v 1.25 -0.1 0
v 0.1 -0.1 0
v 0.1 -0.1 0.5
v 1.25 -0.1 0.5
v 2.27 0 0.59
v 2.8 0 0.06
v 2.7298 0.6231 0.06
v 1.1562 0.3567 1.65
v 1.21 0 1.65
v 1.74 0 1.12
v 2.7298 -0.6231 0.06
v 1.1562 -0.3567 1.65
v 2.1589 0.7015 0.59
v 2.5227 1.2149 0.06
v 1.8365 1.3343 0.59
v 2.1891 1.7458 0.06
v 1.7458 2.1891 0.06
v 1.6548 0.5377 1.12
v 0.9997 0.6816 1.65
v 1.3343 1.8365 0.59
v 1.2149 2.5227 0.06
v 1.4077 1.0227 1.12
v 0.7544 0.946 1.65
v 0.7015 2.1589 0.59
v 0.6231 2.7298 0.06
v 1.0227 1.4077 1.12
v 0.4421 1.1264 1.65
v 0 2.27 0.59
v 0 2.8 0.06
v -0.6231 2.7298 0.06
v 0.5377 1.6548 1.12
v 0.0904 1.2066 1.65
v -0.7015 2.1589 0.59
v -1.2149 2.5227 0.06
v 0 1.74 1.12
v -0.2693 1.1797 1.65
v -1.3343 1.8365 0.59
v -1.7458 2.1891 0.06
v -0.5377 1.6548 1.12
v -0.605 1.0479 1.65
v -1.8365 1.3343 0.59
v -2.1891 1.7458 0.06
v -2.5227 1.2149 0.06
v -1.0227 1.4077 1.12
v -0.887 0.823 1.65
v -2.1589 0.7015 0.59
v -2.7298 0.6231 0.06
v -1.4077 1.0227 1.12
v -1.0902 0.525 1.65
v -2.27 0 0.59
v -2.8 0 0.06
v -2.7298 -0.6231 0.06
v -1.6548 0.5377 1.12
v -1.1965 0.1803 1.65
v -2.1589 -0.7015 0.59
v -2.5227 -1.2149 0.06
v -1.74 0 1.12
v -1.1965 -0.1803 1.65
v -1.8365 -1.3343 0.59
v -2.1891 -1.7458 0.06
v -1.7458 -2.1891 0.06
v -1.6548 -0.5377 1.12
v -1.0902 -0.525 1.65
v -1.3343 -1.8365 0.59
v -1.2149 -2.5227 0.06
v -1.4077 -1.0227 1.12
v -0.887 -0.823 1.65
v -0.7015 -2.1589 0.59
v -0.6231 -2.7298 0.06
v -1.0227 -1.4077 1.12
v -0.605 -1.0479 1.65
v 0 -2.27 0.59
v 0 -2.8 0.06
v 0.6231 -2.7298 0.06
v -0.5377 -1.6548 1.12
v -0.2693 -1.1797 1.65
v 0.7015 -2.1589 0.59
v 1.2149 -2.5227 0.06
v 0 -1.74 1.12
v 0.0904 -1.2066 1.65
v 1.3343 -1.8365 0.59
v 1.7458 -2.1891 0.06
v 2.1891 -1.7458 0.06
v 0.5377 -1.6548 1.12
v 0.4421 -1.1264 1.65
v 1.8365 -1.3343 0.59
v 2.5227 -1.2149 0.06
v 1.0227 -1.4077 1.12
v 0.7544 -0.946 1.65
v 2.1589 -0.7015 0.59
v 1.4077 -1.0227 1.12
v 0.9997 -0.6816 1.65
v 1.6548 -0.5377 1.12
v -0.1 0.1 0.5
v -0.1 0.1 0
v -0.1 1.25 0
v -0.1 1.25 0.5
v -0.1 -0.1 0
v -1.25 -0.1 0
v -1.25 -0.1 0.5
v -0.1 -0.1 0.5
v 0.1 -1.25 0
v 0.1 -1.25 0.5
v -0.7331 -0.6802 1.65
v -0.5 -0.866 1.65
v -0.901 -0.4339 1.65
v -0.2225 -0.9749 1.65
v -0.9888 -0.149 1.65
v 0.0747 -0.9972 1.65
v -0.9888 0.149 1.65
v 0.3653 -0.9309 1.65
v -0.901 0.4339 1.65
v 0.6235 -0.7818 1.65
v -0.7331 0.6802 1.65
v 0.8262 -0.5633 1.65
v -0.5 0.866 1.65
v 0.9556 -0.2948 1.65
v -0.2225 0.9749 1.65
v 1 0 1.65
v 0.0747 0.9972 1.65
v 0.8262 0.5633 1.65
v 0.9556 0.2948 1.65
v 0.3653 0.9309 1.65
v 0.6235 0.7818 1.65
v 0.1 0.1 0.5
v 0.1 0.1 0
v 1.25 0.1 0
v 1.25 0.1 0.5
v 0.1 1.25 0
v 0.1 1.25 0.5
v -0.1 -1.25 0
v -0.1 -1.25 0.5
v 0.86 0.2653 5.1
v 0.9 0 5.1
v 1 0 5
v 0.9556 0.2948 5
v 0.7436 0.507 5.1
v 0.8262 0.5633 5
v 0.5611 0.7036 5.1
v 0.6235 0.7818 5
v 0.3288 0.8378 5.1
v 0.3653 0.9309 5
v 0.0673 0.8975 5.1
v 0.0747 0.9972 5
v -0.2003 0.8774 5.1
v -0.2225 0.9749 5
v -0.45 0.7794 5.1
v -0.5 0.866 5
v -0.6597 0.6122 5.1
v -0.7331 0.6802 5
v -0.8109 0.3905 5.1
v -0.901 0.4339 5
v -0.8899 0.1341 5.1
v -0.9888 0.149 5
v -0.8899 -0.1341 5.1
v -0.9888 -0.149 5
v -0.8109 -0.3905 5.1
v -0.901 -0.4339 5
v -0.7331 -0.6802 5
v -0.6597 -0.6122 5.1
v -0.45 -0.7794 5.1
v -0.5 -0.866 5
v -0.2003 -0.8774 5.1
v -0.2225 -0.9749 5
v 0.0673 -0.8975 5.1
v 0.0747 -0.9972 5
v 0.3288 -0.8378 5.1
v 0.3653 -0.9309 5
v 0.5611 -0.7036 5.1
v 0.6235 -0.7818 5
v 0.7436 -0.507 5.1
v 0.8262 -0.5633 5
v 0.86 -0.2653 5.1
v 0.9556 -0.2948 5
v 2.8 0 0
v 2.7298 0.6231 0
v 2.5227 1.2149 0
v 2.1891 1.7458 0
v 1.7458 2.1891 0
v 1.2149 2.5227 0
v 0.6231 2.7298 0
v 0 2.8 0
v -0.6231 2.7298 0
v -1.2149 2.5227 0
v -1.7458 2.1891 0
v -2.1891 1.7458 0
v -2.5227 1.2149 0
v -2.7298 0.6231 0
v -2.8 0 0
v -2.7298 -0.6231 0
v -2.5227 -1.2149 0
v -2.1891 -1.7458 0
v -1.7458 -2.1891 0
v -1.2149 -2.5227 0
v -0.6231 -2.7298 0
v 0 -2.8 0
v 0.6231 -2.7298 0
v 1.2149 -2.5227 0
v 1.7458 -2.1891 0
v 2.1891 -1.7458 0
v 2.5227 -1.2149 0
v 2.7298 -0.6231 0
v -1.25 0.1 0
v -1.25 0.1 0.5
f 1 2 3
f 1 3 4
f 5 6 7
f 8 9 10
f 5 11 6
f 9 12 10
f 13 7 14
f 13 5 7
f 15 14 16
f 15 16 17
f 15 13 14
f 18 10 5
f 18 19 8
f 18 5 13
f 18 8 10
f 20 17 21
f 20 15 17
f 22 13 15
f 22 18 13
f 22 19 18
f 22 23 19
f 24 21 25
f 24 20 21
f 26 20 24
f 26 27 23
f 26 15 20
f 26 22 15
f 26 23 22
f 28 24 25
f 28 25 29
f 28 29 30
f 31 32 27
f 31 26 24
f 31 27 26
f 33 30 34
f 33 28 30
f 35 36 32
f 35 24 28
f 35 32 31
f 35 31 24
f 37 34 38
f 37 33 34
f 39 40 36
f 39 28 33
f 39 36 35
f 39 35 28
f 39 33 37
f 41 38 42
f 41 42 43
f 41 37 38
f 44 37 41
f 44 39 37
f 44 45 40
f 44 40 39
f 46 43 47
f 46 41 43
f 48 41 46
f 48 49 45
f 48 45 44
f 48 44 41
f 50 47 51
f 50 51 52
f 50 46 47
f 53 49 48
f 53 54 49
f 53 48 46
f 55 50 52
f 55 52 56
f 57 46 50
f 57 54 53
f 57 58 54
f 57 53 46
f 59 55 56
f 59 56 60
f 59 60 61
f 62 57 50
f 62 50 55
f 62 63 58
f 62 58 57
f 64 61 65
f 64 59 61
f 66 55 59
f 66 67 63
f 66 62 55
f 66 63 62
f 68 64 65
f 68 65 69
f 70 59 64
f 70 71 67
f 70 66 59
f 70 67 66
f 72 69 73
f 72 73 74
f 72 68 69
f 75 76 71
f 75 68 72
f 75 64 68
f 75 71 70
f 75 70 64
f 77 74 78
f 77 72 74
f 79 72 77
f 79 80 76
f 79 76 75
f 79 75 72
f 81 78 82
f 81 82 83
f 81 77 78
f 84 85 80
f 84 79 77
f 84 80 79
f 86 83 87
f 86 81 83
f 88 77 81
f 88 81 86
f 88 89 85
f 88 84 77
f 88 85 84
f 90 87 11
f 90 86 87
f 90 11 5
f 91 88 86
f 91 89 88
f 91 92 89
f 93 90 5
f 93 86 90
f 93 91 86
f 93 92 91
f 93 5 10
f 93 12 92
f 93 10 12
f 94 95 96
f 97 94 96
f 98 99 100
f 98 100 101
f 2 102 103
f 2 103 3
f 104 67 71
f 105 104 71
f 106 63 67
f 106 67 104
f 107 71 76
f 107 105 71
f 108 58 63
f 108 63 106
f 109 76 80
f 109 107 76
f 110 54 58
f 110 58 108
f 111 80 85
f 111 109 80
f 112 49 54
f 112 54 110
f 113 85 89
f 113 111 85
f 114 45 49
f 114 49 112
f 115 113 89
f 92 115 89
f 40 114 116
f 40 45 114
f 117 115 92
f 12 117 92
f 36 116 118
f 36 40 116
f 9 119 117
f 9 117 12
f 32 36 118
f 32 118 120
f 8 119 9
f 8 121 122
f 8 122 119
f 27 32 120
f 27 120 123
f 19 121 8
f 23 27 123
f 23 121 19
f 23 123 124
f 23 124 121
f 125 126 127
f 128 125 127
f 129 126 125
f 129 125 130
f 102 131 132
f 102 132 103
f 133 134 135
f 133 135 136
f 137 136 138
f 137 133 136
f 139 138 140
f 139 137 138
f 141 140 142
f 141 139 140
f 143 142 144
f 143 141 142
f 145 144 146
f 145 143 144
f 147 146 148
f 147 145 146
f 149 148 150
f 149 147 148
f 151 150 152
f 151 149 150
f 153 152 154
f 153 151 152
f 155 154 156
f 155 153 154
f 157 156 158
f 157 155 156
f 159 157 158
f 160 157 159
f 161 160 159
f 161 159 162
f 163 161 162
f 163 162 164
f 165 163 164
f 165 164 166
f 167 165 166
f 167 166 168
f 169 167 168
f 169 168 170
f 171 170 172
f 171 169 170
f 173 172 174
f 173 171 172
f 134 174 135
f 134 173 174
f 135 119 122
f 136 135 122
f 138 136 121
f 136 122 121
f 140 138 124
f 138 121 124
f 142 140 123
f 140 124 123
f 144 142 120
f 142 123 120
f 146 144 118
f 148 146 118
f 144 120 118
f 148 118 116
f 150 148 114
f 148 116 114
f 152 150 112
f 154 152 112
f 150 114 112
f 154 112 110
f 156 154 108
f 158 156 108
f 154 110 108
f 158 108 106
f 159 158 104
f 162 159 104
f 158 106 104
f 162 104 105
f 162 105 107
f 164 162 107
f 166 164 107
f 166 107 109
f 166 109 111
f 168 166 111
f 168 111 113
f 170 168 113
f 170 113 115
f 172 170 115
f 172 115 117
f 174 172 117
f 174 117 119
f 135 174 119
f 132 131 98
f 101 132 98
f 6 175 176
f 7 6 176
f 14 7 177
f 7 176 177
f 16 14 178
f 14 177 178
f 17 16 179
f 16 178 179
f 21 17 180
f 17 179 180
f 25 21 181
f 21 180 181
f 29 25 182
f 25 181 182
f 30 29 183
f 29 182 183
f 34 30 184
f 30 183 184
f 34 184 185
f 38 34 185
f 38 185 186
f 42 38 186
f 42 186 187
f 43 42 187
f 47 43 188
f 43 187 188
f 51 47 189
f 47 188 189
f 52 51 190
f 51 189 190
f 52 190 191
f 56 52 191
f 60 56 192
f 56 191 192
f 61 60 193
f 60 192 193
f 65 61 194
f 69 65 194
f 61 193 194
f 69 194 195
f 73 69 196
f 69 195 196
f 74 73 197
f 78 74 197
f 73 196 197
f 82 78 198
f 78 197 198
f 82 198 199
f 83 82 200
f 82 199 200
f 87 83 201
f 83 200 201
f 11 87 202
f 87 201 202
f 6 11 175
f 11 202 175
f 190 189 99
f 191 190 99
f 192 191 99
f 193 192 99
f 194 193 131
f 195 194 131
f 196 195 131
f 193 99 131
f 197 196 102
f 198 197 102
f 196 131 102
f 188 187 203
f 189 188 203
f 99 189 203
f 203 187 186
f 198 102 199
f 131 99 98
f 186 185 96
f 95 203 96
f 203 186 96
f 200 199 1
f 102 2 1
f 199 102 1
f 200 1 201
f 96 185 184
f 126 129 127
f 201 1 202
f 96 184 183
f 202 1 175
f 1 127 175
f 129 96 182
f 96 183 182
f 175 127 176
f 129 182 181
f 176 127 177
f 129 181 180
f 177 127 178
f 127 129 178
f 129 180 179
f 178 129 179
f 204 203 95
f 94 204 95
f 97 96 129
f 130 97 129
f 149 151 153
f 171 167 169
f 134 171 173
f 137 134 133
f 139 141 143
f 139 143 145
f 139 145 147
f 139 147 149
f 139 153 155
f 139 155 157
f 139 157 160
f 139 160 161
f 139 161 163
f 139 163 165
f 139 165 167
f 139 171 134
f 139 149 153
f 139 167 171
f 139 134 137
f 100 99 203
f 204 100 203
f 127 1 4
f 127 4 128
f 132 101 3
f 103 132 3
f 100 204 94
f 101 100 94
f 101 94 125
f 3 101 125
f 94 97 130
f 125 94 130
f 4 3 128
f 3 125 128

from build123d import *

# Parameters (mm, degrees)
BOX_W             = 0.2
BOX_H             = 2.5
BOX_DEPTH         = 0.5
BOX001_W          = 2.5
BOX001_H          = 0.2
BOX001_DEPTH      = 0.5
CYLINDER_R        = 2.8
CYLINDER_DEPTH    = 1.65
CYLINDER001_R     = 1
CYLINDER001_DEPTH = 5
CHAMFER_SIZE      = 1.59
CHAMFER001_SIZE   = 0.1


with BuildPart() as w_rfel:
    # Box → Box (new body)
    with BuildSketch(Plane(origin=(-0.1, -1.25, 0), x_dir=(1, 0, 0), z_dir=(0, 0, 1))):
        with Locations((0.1, 1.25)):
            Rectangle(BOX_W, BOX_H)
    extrude(amount=BOX_DEPTH)


with BuildPart() as fusion:
    # Box001 → Box001 (new body)
    with BuildSketch(Plane(origin=(-1.25, -0.1, 0), x_dir=(1, 0, 0), z_dir=(0, 0, 1))):
        with Locations((1.25, 0.1)):
            Rectangle(BOX001_W, BOX001_H)
    extrude(amount=BOX001_DEPTH)

    # Fusion: union Würfel
    add(w_rfel.part)


with BuildPart() as zylinder:
    # Cylinder → Cylinder (new body)
    with BuildSketch(Plane.XY):
        Circle(CYLINDER_R)
    extrude(amount=CYLINDER_DEPTH)


with BuildPart() as screw:
    # Cylinder001 → Cylinder001 (new body)
    with BuildSketch(Plane.XY.offset(0.1)):
        Circle(CYLINDER001_R)
    extrude(amount=CYLINDER001_DEPTH)

    # Fusion001: union Zylinder
    add(zylinder.part)

    # Cut: cut Fusion
    add(fusion.part, mode=Mode.SUBTRACT)

    # Chamfer
    chamfer_edges = [screw.edges().sort_by_distance(p)[0] for p in [
        (-2.8, 0, 1.65),
    ]]
    chamfer(chamfer_edges, length=CHAMFER_SIZE)

    # Chamfer001
    chamfer001_edges = [screw.edges().sort_by_distance(p)[0] for p in [
        (-1, 0, 5.1),
    ]]
    chamfer(chamfer001_edges, length=CHAMFER001_SIZE)


solid = screw.part
